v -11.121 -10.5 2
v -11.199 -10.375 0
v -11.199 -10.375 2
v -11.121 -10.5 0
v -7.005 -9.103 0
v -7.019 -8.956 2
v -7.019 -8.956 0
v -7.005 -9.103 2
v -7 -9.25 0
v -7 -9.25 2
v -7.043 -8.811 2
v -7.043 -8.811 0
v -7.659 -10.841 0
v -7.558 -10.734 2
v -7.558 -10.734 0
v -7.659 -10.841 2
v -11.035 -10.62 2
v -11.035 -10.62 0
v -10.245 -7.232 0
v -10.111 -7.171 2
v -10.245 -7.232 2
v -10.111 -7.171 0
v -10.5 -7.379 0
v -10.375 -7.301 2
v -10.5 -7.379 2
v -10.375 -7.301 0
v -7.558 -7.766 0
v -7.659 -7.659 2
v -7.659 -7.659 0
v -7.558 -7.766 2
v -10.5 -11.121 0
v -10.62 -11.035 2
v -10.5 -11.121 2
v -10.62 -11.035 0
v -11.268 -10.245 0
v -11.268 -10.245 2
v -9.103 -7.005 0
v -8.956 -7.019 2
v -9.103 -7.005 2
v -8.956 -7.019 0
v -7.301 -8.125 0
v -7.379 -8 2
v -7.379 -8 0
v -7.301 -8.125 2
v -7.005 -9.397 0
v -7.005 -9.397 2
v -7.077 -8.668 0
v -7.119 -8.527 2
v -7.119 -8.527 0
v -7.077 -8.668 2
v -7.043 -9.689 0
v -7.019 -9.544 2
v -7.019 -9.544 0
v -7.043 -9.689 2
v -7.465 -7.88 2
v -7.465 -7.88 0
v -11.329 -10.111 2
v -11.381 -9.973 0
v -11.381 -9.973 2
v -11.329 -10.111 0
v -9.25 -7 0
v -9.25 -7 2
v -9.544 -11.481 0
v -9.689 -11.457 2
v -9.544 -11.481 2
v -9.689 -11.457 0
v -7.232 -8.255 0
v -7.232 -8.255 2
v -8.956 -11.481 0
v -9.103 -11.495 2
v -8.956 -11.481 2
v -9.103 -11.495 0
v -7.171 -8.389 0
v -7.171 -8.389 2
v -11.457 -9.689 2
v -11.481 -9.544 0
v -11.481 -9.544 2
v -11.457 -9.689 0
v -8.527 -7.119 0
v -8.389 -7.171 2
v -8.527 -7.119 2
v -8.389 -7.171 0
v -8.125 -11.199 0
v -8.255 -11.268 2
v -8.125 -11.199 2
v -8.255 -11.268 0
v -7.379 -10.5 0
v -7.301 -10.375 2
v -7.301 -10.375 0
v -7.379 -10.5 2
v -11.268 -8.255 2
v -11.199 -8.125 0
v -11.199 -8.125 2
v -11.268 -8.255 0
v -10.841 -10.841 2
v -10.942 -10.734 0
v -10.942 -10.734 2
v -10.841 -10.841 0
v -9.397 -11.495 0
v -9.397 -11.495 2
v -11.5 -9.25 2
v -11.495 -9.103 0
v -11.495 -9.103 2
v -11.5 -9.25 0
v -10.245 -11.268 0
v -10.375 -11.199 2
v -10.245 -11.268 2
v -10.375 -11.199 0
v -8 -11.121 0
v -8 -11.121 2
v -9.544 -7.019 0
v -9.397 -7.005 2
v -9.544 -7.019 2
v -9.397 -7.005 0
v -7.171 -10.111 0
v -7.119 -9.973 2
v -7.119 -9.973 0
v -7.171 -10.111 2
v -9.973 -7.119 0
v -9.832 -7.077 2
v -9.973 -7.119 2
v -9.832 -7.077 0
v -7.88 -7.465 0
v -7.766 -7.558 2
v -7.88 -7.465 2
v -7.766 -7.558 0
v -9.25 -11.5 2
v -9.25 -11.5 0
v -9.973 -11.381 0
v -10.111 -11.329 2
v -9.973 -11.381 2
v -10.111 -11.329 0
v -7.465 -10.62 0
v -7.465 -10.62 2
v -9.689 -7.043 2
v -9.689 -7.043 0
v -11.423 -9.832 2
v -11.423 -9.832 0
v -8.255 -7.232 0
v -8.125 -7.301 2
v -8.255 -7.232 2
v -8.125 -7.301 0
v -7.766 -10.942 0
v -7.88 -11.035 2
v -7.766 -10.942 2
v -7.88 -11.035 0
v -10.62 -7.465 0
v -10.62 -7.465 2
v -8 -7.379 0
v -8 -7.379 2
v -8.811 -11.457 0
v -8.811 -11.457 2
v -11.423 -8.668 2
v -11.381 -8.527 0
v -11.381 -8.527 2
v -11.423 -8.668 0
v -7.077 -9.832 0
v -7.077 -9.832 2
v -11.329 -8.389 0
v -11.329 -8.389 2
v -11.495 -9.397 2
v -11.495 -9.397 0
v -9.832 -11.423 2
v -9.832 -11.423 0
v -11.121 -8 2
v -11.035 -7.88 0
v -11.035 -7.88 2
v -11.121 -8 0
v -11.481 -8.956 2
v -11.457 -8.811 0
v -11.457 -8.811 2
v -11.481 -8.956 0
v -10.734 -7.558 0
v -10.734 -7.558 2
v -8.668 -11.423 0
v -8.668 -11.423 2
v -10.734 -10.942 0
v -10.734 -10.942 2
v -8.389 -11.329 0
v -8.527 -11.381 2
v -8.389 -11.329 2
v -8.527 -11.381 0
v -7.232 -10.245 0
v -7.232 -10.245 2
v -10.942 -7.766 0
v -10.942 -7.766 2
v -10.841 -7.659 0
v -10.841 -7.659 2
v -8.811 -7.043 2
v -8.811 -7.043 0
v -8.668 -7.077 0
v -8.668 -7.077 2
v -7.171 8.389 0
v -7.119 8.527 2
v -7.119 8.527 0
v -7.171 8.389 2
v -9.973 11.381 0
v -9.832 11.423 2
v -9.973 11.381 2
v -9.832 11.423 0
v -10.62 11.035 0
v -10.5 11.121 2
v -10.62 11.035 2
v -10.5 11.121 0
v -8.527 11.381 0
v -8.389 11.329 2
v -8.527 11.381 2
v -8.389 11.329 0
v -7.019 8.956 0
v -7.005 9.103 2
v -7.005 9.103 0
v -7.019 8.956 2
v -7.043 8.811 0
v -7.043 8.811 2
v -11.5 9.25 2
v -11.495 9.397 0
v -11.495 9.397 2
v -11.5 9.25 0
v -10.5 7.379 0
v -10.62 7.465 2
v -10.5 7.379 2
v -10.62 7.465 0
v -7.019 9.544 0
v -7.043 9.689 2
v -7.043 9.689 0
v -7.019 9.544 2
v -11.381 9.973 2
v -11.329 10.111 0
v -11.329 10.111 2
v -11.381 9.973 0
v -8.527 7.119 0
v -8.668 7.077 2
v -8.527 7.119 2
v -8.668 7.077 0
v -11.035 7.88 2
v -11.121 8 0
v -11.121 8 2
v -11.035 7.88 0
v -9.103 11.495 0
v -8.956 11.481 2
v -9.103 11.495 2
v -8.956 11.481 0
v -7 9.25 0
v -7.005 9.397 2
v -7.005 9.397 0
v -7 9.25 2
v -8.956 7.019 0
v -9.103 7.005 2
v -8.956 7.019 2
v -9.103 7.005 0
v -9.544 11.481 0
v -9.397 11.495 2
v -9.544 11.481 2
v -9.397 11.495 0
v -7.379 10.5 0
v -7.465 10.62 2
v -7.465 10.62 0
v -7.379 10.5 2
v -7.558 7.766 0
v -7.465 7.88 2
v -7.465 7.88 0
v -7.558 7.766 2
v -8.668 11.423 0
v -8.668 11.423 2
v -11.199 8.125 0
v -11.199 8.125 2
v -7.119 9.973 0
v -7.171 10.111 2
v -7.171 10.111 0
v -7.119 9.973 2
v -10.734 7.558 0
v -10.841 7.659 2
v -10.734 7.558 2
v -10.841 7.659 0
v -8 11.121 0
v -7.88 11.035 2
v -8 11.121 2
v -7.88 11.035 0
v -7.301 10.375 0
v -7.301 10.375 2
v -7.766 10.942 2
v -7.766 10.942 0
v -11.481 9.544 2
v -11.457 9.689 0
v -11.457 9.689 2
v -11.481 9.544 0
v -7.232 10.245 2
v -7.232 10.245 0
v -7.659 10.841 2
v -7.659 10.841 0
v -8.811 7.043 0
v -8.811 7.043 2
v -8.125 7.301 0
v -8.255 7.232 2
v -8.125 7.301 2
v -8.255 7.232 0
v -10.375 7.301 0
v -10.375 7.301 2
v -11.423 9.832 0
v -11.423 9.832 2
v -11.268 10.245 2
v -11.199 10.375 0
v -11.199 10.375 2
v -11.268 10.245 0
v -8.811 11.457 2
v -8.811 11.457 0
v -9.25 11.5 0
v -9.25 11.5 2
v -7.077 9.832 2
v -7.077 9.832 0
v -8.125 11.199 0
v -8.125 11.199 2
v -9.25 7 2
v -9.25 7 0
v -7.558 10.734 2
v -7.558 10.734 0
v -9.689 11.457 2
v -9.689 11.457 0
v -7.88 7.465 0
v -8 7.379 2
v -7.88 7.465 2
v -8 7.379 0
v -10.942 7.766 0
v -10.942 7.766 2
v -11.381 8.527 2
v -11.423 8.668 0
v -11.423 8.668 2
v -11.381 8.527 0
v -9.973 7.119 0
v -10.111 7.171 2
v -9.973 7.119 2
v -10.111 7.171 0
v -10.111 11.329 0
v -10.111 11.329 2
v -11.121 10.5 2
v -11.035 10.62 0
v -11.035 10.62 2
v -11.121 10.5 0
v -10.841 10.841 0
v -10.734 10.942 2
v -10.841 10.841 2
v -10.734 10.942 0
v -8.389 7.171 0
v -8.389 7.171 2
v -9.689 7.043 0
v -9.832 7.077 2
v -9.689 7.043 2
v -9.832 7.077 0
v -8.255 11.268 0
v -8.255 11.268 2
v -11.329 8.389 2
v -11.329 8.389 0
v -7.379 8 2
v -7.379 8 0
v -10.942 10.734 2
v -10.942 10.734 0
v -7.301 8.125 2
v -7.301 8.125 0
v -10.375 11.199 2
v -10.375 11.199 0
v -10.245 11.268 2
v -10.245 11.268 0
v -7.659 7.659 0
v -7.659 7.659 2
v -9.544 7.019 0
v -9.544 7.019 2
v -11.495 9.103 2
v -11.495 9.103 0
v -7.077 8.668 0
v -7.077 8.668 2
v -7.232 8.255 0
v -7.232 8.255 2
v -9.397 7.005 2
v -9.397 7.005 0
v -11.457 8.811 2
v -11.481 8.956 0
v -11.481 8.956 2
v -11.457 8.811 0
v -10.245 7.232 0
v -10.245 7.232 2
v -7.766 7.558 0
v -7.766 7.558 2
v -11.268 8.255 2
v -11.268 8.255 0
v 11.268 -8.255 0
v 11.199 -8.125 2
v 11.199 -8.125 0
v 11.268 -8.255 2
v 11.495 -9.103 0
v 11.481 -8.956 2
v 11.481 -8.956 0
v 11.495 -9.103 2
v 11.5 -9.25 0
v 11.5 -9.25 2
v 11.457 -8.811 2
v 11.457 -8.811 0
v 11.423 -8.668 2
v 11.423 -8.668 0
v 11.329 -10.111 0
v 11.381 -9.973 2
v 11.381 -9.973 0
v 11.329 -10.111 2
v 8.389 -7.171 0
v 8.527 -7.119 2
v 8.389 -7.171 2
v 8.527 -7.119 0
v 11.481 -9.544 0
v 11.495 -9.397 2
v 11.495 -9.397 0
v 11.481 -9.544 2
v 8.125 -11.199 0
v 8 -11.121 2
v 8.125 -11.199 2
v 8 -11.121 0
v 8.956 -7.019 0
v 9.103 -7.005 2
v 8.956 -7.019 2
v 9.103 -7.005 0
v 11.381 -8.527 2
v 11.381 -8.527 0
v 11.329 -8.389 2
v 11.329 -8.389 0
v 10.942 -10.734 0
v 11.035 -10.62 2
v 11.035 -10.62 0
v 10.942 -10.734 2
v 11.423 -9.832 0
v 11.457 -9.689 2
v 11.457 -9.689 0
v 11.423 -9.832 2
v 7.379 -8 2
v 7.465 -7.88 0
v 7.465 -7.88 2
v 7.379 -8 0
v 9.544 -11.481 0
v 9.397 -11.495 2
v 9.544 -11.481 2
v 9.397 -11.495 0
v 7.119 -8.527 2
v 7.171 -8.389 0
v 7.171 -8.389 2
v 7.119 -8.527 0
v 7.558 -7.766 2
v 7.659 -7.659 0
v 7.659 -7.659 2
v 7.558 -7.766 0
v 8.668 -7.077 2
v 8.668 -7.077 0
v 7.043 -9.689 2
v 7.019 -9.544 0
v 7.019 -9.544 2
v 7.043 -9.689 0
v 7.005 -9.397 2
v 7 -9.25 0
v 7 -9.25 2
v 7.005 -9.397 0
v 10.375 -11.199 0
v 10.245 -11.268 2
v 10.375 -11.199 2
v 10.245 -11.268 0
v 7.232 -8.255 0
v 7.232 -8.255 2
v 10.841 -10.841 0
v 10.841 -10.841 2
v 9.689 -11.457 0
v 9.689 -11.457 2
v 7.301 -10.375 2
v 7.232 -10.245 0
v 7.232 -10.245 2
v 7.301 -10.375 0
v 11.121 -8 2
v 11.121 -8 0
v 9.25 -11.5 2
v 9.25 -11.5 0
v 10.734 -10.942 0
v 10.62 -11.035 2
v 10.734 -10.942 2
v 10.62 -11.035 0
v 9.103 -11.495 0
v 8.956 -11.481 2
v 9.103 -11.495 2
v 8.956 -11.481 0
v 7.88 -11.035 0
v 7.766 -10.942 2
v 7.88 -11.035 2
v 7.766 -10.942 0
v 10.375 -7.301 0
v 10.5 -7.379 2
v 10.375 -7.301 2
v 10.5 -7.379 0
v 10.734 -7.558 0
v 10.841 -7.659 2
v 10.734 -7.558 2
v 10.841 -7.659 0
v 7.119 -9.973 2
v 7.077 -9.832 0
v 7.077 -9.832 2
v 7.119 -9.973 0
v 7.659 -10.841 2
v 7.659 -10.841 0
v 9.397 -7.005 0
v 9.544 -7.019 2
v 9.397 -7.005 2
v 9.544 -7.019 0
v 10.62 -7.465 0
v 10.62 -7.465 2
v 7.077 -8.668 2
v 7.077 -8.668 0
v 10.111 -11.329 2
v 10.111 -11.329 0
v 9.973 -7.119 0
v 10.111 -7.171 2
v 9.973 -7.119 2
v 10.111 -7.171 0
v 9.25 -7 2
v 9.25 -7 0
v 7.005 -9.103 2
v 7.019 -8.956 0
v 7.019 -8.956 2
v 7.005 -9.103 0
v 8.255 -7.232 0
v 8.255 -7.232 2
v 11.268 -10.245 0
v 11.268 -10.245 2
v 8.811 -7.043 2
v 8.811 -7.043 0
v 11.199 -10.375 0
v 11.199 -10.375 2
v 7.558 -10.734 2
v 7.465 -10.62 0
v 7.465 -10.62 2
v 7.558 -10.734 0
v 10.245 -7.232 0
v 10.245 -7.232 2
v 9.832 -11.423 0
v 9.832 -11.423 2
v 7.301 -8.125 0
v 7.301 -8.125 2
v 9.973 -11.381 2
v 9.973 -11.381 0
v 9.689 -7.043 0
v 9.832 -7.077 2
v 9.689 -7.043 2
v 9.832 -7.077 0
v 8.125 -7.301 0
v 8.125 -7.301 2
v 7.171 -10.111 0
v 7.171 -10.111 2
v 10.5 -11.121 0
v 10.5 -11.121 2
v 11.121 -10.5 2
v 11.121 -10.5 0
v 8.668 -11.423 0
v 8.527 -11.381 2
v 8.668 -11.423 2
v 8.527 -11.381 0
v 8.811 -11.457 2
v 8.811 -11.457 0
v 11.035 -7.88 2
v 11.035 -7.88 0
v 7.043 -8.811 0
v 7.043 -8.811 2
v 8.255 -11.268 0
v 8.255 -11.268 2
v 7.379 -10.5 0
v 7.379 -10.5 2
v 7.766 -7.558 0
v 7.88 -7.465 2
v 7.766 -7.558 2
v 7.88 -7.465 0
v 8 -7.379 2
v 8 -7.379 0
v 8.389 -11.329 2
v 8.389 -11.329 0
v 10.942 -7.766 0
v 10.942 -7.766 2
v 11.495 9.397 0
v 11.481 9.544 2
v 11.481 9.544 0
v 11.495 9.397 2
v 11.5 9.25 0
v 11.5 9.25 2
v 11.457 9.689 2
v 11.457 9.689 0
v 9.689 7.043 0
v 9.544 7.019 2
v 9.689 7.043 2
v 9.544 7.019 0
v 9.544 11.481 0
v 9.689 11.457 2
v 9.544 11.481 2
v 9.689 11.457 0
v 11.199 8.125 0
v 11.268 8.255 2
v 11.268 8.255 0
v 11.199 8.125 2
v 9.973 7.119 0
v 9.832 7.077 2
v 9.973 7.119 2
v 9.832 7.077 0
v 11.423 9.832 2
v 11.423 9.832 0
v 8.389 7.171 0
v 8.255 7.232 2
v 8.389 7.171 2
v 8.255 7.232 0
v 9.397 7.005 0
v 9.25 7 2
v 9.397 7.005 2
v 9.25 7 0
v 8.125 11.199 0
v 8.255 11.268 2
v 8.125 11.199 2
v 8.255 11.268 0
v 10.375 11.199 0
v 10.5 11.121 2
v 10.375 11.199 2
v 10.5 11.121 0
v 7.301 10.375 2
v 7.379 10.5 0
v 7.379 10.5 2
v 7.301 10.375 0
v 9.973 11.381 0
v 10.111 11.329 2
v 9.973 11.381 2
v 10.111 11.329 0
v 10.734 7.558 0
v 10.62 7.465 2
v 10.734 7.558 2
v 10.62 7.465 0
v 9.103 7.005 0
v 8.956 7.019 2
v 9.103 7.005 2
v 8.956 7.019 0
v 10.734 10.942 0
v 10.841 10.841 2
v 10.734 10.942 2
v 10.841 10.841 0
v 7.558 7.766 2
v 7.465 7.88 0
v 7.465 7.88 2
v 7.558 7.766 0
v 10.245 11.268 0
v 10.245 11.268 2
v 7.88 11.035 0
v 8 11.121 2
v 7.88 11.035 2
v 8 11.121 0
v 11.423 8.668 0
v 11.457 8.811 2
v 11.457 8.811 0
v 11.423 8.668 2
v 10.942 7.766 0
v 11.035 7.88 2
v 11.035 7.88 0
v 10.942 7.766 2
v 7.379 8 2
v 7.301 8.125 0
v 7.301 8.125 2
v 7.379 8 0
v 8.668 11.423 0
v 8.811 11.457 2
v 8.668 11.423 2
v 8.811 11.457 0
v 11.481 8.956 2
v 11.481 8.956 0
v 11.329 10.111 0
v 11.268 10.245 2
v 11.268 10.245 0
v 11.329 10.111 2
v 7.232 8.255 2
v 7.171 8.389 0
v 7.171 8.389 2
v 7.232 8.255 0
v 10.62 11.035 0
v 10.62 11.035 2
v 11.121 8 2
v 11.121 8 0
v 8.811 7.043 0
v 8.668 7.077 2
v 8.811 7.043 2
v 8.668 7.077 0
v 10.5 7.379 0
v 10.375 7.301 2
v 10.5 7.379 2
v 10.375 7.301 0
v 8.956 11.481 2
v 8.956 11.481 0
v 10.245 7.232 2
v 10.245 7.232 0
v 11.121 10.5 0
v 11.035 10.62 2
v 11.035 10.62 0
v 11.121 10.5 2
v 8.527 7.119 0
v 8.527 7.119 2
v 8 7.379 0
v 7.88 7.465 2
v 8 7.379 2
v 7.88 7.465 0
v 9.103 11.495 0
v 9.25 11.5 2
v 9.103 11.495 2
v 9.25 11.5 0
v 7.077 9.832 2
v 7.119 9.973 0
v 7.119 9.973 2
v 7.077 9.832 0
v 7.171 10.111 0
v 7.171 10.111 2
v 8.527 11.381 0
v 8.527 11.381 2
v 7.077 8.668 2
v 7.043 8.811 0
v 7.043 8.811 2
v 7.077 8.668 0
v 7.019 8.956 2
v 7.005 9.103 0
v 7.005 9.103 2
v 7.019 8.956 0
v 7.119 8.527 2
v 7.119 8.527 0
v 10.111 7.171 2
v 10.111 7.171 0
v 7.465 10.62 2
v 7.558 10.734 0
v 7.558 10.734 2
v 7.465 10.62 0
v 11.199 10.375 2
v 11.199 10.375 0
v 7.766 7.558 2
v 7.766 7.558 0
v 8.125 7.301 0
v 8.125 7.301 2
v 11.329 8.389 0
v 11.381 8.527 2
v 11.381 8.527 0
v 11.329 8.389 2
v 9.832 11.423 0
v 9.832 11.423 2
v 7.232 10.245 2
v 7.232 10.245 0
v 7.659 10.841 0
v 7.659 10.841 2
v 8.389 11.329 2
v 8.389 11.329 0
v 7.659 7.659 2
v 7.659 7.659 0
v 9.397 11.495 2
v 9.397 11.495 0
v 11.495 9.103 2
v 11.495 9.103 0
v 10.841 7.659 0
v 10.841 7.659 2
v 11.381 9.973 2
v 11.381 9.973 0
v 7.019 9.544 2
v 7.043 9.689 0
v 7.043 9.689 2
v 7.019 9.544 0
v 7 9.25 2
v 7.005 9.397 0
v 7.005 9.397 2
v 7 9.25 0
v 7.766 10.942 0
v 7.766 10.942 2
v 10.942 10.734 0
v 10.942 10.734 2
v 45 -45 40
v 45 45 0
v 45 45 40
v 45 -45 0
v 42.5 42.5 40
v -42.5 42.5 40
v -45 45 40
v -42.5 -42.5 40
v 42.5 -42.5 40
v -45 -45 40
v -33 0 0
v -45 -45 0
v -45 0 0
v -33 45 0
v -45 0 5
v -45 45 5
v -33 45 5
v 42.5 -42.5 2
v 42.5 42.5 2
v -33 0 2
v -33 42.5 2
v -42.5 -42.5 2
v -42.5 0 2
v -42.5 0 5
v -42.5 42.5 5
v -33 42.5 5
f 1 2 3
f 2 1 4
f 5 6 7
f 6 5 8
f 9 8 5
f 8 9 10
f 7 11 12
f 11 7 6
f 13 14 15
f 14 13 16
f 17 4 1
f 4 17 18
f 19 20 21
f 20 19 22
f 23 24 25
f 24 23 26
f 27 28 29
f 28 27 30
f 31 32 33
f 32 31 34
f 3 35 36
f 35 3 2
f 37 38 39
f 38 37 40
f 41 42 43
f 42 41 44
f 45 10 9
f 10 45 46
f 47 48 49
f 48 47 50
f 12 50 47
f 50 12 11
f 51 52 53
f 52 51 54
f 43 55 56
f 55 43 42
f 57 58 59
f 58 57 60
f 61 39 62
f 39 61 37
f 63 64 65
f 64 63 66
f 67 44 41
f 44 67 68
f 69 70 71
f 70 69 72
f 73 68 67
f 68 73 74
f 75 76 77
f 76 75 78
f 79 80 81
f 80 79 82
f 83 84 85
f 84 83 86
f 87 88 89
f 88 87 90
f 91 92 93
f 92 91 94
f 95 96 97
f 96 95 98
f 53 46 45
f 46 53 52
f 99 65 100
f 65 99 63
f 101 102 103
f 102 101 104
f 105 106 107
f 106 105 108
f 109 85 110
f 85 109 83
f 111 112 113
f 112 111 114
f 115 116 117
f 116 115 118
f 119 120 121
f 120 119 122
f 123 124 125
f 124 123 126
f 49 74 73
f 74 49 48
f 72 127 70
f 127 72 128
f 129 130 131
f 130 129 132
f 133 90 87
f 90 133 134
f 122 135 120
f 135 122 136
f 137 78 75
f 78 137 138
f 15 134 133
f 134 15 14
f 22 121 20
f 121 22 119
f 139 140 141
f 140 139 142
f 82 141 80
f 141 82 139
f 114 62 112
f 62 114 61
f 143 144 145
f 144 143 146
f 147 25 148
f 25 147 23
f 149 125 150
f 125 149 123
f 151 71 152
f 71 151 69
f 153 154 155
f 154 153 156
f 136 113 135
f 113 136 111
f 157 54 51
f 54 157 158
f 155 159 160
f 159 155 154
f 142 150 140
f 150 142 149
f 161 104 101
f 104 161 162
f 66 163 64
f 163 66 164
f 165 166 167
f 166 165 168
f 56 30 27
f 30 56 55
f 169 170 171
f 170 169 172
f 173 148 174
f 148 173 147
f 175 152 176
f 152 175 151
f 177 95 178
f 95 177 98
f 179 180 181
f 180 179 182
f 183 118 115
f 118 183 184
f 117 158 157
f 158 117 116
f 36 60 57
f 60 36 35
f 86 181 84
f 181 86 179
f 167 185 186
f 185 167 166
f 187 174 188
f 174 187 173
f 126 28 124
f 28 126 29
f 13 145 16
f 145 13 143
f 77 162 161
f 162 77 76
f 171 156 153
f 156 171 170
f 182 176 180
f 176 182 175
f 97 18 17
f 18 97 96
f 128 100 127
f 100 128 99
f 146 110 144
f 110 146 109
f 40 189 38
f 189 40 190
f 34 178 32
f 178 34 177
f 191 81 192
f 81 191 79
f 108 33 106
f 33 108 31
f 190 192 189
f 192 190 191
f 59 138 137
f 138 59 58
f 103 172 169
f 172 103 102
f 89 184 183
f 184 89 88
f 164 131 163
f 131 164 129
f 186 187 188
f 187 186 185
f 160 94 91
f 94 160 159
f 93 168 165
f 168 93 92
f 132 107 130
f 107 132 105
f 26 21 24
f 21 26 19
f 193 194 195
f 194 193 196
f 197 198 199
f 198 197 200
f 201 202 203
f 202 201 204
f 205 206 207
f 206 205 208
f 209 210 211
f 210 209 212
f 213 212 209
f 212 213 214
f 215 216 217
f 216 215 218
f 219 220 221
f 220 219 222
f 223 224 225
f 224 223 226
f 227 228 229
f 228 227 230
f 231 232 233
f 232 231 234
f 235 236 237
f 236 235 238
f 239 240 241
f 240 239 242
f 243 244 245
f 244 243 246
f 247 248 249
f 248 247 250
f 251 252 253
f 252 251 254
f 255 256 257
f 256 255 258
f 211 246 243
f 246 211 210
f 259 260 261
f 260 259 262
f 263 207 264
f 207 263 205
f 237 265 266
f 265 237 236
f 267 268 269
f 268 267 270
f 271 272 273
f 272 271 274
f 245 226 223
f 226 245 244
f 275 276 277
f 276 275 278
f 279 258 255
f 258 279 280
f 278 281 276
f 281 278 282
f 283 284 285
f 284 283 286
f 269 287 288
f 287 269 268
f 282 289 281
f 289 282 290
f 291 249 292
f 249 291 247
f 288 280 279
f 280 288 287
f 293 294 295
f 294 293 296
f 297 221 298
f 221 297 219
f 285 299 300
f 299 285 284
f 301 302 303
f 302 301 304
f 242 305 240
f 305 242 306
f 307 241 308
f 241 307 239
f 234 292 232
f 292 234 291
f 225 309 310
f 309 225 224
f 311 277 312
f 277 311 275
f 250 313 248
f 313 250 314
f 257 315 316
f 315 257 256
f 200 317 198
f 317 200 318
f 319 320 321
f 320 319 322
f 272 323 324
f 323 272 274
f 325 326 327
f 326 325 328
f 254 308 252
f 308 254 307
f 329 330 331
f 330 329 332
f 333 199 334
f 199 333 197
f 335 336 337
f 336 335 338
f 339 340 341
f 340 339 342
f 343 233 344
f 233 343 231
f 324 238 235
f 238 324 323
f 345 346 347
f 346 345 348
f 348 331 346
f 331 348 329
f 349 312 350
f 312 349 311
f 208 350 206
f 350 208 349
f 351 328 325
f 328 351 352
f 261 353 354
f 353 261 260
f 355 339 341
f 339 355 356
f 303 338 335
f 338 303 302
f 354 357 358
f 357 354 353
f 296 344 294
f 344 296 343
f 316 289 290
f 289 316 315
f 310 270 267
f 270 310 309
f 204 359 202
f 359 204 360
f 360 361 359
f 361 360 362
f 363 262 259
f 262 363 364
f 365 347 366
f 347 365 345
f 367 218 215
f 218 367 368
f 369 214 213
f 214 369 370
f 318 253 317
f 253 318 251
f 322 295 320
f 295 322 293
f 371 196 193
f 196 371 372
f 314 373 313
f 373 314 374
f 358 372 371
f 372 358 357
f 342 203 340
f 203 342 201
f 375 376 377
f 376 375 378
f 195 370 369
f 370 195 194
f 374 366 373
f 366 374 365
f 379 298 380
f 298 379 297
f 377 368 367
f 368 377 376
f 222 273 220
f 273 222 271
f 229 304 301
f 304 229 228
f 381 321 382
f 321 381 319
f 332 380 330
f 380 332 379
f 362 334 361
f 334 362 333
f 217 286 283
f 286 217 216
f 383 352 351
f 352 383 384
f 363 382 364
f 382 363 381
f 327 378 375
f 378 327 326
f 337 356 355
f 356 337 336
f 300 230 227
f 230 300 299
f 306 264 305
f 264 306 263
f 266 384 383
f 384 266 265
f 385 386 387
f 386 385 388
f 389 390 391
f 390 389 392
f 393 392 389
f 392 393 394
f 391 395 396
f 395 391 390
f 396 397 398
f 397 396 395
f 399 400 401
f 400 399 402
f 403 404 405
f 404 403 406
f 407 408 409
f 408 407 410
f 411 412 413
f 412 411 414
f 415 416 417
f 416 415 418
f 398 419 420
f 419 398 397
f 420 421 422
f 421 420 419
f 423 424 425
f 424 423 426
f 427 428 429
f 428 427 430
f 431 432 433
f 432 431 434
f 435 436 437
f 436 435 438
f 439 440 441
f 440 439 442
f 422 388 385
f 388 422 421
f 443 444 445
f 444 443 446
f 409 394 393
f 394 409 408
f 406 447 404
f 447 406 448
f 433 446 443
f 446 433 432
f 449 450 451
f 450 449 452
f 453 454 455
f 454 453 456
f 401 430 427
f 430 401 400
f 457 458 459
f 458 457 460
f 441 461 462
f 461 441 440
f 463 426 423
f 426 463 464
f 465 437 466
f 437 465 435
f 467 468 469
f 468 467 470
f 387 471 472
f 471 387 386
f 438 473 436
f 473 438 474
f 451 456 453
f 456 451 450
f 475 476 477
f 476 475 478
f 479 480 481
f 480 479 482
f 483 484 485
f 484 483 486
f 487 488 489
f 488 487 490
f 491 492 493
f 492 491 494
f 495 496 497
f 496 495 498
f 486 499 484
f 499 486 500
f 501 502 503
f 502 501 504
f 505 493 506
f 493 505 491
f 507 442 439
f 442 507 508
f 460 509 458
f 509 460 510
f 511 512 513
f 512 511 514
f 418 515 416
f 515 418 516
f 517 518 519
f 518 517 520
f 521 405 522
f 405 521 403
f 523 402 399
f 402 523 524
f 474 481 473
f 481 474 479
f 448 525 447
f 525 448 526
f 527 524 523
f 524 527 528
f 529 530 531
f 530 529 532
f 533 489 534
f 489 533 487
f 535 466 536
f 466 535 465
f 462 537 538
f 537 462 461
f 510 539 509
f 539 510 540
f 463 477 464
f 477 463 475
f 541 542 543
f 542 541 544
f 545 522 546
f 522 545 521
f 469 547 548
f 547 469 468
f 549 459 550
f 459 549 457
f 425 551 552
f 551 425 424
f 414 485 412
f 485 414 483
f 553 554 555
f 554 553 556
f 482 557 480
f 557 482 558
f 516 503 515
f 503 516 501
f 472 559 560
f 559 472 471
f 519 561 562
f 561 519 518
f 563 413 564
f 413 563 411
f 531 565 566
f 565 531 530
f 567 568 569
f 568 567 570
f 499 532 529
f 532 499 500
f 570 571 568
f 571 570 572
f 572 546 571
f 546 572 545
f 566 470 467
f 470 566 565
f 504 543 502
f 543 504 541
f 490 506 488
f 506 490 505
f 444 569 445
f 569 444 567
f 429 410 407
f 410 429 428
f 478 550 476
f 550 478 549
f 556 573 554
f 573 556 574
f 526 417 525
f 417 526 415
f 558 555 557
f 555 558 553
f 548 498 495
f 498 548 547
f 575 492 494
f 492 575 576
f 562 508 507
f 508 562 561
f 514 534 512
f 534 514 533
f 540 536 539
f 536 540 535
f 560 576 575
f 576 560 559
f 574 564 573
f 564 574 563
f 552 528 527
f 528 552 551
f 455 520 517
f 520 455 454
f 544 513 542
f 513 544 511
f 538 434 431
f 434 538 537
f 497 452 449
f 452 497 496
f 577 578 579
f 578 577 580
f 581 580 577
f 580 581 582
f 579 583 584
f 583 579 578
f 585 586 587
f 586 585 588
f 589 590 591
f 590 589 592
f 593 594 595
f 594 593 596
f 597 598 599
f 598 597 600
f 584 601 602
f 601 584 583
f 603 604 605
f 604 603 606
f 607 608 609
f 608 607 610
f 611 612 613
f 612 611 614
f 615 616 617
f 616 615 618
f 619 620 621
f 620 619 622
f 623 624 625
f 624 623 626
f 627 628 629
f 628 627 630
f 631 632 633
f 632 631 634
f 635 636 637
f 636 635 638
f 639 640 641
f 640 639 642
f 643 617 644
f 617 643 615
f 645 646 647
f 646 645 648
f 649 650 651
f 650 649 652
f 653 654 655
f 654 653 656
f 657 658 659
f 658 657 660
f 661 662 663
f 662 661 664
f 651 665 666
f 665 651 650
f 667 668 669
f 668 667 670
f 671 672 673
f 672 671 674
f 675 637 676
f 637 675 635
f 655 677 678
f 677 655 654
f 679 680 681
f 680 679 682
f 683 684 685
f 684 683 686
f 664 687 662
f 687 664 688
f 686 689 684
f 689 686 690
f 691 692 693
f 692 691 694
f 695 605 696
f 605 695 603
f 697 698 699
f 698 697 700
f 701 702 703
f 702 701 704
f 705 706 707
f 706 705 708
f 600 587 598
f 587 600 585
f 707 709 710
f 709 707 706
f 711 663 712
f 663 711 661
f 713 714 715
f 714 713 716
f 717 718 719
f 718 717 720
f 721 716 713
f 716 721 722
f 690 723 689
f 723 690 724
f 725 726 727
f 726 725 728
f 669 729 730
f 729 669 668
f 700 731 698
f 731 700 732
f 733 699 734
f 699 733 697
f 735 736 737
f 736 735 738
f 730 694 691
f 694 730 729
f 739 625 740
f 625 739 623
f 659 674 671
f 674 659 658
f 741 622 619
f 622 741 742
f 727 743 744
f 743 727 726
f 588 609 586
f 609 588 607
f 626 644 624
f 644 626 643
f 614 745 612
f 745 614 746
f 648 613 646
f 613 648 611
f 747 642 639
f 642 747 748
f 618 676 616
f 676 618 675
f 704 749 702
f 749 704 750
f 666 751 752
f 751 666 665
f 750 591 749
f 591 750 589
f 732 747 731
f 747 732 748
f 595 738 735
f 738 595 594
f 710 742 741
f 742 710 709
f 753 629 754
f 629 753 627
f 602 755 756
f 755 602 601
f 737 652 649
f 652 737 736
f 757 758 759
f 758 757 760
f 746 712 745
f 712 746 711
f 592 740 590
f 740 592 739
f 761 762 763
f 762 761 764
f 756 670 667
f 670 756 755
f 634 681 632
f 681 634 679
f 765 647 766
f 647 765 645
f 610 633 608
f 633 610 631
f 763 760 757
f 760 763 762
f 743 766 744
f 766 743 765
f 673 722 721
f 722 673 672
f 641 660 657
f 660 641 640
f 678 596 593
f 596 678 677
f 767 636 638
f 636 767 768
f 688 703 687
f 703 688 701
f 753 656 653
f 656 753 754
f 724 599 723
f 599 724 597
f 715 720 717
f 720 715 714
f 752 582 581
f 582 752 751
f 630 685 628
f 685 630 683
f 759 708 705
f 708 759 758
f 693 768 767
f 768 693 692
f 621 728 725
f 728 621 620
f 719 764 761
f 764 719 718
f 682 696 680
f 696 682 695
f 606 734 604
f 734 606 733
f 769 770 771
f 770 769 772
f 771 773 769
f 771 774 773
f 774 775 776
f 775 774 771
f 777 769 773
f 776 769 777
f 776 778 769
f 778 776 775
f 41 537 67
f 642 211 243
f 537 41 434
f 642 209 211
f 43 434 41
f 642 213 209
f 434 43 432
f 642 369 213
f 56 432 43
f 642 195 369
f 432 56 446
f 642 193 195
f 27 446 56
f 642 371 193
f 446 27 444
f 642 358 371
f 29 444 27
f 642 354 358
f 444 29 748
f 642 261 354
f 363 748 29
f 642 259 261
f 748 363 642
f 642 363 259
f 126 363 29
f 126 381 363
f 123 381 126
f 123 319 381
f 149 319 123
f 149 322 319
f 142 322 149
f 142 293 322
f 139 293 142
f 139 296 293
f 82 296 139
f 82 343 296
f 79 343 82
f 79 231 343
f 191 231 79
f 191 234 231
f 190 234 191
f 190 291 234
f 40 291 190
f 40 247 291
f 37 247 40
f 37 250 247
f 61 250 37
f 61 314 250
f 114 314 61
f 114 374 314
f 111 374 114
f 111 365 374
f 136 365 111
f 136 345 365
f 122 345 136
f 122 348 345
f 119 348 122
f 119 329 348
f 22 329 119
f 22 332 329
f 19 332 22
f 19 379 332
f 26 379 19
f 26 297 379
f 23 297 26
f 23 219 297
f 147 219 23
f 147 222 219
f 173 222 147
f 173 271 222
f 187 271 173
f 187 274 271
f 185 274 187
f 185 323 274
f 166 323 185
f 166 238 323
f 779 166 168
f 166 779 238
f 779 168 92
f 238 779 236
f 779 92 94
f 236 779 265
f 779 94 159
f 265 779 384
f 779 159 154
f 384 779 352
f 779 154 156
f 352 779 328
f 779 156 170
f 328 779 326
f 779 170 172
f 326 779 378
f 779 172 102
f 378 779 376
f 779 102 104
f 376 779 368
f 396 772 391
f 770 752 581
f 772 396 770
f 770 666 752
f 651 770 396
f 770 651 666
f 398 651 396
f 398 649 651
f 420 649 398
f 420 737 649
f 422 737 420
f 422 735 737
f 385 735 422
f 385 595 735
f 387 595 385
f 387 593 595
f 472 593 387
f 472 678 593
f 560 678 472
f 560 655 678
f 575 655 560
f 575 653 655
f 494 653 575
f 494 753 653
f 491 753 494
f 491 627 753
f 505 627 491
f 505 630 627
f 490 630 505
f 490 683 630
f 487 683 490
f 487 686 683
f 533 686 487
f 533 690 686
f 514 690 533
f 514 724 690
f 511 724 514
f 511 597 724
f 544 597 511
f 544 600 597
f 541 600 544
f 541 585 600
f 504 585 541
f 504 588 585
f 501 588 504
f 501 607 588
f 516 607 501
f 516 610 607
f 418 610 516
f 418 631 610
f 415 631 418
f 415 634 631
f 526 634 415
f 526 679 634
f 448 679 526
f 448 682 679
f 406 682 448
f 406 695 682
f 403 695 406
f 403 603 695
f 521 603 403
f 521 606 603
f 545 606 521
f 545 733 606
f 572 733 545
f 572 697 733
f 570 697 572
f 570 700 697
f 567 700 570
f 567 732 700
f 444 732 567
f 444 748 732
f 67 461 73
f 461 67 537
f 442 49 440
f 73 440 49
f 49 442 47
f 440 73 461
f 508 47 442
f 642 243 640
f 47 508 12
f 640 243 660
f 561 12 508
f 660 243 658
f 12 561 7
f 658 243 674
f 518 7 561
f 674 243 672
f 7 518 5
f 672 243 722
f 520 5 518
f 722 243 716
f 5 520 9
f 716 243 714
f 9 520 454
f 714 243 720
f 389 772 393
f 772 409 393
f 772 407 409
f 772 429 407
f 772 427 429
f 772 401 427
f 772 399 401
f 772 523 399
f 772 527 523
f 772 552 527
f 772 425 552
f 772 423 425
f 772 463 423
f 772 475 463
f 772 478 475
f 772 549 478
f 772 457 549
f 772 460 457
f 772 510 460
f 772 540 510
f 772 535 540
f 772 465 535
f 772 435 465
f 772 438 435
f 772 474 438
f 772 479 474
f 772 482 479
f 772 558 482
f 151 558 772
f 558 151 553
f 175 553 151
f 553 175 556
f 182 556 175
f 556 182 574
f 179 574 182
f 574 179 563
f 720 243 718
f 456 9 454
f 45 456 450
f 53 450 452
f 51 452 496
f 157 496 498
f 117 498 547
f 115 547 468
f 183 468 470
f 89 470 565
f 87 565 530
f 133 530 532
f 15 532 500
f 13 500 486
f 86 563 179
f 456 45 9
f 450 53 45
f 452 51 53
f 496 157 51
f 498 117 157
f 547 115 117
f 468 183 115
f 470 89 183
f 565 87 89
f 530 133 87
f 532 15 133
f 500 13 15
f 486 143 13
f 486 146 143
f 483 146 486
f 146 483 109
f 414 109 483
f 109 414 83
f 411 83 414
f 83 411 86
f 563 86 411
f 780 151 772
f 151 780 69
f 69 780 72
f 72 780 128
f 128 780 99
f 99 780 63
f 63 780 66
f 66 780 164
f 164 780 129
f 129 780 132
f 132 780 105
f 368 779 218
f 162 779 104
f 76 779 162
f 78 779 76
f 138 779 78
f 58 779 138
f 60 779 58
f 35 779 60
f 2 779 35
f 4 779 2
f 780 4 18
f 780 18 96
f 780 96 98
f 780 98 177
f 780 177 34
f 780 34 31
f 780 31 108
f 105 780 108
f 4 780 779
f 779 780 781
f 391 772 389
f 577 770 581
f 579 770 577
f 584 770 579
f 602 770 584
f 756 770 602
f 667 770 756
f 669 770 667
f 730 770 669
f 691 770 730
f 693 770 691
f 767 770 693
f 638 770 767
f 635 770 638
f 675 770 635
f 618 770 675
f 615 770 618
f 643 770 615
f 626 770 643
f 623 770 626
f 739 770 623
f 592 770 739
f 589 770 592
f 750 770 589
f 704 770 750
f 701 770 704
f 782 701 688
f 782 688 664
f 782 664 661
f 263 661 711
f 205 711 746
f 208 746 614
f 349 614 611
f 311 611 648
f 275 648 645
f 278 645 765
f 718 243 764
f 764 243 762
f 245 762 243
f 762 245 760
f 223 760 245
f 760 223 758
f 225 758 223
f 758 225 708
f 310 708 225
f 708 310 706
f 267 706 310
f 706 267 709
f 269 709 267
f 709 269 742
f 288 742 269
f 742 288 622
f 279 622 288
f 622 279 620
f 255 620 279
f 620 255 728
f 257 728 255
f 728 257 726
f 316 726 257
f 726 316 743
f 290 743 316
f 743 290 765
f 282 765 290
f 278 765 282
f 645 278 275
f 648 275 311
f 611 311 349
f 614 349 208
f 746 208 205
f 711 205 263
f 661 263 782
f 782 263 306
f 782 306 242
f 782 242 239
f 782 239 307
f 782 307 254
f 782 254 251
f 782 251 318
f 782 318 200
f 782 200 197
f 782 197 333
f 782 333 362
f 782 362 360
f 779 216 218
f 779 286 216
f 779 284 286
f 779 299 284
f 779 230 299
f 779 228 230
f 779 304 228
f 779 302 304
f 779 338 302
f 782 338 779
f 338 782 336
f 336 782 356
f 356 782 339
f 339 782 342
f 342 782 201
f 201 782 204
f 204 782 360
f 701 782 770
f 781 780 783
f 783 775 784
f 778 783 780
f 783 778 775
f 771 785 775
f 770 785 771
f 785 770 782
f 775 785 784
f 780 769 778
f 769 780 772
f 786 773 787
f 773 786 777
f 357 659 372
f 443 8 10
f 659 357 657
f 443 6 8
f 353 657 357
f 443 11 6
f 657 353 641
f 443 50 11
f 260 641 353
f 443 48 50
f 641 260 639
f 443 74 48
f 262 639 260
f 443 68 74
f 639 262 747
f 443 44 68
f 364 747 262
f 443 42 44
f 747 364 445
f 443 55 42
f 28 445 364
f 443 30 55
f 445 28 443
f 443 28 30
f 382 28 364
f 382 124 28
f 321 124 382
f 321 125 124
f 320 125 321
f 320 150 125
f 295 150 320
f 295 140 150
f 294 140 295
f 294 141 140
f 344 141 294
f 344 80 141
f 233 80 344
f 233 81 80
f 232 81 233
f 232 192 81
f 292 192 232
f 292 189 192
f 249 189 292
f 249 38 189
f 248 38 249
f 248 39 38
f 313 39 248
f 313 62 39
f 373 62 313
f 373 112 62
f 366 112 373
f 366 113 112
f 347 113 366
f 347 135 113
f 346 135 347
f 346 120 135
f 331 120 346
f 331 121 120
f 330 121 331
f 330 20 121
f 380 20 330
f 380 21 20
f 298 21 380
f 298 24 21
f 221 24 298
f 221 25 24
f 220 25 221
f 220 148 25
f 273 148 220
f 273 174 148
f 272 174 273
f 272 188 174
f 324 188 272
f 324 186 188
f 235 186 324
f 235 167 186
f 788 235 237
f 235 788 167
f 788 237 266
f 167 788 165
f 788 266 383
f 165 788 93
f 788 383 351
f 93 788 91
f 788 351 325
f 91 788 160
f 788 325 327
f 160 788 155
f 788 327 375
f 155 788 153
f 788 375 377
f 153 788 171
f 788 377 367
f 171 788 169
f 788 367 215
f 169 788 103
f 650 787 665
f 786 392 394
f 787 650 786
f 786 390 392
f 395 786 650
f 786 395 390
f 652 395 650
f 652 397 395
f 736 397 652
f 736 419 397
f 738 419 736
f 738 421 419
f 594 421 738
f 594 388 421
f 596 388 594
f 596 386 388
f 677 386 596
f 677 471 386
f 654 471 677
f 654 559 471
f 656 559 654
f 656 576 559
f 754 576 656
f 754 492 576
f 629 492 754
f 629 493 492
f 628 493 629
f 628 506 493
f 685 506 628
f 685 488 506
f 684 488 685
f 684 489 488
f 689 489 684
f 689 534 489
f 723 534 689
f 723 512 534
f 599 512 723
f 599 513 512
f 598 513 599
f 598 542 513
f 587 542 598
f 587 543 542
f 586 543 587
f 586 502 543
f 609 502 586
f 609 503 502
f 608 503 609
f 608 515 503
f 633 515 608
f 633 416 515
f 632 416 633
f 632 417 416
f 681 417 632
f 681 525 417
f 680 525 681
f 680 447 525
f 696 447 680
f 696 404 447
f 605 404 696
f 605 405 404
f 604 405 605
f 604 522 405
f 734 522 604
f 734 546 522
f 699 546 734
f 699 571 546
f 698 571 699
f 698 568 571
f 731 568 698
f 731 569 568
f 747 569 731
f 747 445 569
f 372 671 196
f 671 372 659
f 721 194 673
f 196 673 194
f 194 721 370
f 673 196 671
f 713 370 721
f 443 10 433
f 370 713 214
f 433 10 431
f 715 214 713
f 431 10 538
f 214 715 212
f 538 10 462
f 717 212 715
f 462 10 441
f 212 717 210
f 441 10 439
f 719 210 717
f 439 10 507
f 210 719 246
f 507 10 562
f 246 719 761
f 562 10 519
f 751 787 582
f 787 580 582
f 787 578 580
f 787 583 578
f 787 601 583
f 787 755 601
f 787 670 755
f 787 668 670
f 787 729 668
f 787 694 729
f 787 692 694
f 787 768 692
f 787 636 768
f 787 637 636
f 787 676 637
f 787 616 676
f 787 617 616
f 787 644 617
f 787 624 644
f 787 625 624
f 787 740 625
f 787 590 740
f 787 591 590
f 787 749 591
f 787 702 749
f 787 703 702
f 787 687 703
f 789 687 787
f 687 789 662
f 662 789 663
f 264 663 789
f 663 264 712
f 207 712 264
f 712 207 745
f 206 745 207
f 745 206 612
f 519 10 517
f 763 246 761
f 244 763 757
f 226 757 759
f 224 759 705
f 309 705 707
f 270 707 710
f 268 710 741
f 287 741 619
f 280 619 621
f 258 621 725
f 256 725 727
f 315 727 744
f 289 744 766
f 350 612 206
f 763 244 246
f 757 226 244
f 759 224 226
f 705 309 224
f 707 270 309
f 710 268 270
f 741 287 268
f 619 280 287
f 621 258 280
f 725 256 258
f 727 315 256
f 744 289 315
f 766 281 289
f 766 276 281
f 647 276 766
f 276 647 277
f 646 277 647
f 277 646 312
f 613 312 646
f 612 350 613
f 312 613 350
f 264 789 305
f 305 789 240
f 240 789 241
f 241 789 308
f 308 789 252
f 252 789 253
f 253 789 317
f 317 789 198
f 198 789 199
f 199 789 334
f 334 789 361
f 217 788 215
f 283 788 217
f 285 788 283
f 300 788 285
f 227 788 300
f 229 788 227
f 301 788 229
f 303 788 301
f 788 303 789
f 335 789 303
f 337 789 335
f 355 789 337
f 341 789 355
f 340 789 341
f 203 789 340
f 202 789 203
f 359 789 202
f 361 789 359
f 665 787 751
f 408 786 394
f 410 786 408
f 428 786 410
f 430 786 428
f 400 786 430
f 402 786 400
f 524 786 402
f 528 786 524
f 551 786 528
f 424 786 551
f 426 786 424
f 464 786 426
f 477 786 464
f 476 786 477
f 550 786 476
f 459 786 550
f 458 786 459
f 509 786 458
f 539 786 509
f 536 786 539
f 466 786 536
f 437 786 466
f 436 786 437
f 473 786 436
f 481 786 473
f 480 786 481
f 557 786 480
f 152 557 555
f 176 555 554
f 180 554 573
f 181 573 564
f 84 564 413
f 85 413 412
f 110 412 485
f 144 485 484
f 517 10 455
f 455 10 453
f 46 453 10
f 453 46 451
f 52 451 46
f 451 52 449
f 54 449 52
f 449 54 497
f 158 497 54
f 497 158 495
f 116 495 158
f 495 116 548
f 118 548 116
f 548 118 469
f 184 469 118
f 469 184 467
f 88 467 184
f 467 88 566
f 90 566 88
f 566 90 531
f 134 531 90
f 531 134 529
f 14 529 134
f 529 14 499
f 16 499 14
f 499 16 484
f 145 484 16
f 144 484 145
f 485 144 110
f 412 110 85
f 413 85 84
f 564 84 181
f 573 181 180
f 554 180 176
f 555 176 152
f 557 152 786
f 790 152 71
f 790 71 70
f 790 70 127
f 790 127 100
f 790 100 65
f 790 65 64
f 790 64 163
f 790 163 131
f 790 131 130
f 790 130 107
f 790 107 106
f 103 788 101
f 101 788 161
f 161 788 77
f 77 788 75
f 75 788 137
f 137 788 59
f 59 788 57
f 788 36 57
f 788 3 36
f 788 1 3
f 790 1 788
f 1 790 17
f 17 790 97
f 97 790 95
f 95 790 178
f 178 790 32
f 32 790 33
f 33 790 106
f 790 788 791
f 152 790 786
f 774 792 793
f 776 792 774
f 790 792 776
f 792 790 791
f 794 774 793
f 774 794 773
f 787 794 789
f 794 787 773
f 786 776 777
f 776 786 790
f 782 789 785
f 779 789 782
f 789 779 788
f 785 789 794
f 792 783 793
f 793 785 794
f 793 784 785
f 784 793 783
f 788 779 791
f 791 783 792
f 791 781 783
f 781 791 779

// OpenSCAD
// Magnetic stirrer housing for an 80 mm PC case fan
// Print orientation: top plate on bed (z = 0), walls rise to z = 40, open top

// ---------- Parameters ----------
top_thickness      = 2;     // top plate thickness
wall_thickness     = 2.5;   // wall thickness
box_height         = 40;    // total height of walls (open top at z = 40)
outer_size         = 90;    // outer X and Y size of box
screw_hole_d       = 4.5;   // M4 screw hole diameter
screw_hole_pitch   = 71.5;  // square pattern pitch for screw holes
cable_notch_w      = 12;    // cable notch width
cable_notch_depth  = 8;     // notch depth from open edge (z = 32 to 40)
eps                = 0.5;   // cutter overshoot past faces

$fn = 96;

// ---------- Derived ----------
inner_size = outer_size - 2 * wall_thickness;   // 85 x 85 mm open top
first_hole = (outer_size - screw_hole_pitch) / 2; // 9.25 mm offset from centre

// ---------- Model ----------
difference() {
    // Solid box: top plate + walls, open at top
    translate([-outer_size / 2, -outer_size / 2, 0])
        cube([outer_size, outer_size, box_height]);

    // Open top (through the walls)
    translate([-inner_size / 2, -inner_size / 2, top_thickness])
        cube([inner_size, inner_size, box_height - top_thickness + eps]);

    // Screw holes through the top plate
    for (sx = [-first_hole, first_hole], sy = [-first_hole, first_hole])
        translate([sx, sy, -eps])
            cylinder(d = screw_hole_d, h = top_thickness + 2 * eps);

    // Cable notch in one wall, centred along the wall
    translate([-outer_size / 2, 0, top_thickness + wall_thickness - cable_notch_depth])
        cube([cable_notch_w, outer_size, cable_notch_depth + eps]);
}
